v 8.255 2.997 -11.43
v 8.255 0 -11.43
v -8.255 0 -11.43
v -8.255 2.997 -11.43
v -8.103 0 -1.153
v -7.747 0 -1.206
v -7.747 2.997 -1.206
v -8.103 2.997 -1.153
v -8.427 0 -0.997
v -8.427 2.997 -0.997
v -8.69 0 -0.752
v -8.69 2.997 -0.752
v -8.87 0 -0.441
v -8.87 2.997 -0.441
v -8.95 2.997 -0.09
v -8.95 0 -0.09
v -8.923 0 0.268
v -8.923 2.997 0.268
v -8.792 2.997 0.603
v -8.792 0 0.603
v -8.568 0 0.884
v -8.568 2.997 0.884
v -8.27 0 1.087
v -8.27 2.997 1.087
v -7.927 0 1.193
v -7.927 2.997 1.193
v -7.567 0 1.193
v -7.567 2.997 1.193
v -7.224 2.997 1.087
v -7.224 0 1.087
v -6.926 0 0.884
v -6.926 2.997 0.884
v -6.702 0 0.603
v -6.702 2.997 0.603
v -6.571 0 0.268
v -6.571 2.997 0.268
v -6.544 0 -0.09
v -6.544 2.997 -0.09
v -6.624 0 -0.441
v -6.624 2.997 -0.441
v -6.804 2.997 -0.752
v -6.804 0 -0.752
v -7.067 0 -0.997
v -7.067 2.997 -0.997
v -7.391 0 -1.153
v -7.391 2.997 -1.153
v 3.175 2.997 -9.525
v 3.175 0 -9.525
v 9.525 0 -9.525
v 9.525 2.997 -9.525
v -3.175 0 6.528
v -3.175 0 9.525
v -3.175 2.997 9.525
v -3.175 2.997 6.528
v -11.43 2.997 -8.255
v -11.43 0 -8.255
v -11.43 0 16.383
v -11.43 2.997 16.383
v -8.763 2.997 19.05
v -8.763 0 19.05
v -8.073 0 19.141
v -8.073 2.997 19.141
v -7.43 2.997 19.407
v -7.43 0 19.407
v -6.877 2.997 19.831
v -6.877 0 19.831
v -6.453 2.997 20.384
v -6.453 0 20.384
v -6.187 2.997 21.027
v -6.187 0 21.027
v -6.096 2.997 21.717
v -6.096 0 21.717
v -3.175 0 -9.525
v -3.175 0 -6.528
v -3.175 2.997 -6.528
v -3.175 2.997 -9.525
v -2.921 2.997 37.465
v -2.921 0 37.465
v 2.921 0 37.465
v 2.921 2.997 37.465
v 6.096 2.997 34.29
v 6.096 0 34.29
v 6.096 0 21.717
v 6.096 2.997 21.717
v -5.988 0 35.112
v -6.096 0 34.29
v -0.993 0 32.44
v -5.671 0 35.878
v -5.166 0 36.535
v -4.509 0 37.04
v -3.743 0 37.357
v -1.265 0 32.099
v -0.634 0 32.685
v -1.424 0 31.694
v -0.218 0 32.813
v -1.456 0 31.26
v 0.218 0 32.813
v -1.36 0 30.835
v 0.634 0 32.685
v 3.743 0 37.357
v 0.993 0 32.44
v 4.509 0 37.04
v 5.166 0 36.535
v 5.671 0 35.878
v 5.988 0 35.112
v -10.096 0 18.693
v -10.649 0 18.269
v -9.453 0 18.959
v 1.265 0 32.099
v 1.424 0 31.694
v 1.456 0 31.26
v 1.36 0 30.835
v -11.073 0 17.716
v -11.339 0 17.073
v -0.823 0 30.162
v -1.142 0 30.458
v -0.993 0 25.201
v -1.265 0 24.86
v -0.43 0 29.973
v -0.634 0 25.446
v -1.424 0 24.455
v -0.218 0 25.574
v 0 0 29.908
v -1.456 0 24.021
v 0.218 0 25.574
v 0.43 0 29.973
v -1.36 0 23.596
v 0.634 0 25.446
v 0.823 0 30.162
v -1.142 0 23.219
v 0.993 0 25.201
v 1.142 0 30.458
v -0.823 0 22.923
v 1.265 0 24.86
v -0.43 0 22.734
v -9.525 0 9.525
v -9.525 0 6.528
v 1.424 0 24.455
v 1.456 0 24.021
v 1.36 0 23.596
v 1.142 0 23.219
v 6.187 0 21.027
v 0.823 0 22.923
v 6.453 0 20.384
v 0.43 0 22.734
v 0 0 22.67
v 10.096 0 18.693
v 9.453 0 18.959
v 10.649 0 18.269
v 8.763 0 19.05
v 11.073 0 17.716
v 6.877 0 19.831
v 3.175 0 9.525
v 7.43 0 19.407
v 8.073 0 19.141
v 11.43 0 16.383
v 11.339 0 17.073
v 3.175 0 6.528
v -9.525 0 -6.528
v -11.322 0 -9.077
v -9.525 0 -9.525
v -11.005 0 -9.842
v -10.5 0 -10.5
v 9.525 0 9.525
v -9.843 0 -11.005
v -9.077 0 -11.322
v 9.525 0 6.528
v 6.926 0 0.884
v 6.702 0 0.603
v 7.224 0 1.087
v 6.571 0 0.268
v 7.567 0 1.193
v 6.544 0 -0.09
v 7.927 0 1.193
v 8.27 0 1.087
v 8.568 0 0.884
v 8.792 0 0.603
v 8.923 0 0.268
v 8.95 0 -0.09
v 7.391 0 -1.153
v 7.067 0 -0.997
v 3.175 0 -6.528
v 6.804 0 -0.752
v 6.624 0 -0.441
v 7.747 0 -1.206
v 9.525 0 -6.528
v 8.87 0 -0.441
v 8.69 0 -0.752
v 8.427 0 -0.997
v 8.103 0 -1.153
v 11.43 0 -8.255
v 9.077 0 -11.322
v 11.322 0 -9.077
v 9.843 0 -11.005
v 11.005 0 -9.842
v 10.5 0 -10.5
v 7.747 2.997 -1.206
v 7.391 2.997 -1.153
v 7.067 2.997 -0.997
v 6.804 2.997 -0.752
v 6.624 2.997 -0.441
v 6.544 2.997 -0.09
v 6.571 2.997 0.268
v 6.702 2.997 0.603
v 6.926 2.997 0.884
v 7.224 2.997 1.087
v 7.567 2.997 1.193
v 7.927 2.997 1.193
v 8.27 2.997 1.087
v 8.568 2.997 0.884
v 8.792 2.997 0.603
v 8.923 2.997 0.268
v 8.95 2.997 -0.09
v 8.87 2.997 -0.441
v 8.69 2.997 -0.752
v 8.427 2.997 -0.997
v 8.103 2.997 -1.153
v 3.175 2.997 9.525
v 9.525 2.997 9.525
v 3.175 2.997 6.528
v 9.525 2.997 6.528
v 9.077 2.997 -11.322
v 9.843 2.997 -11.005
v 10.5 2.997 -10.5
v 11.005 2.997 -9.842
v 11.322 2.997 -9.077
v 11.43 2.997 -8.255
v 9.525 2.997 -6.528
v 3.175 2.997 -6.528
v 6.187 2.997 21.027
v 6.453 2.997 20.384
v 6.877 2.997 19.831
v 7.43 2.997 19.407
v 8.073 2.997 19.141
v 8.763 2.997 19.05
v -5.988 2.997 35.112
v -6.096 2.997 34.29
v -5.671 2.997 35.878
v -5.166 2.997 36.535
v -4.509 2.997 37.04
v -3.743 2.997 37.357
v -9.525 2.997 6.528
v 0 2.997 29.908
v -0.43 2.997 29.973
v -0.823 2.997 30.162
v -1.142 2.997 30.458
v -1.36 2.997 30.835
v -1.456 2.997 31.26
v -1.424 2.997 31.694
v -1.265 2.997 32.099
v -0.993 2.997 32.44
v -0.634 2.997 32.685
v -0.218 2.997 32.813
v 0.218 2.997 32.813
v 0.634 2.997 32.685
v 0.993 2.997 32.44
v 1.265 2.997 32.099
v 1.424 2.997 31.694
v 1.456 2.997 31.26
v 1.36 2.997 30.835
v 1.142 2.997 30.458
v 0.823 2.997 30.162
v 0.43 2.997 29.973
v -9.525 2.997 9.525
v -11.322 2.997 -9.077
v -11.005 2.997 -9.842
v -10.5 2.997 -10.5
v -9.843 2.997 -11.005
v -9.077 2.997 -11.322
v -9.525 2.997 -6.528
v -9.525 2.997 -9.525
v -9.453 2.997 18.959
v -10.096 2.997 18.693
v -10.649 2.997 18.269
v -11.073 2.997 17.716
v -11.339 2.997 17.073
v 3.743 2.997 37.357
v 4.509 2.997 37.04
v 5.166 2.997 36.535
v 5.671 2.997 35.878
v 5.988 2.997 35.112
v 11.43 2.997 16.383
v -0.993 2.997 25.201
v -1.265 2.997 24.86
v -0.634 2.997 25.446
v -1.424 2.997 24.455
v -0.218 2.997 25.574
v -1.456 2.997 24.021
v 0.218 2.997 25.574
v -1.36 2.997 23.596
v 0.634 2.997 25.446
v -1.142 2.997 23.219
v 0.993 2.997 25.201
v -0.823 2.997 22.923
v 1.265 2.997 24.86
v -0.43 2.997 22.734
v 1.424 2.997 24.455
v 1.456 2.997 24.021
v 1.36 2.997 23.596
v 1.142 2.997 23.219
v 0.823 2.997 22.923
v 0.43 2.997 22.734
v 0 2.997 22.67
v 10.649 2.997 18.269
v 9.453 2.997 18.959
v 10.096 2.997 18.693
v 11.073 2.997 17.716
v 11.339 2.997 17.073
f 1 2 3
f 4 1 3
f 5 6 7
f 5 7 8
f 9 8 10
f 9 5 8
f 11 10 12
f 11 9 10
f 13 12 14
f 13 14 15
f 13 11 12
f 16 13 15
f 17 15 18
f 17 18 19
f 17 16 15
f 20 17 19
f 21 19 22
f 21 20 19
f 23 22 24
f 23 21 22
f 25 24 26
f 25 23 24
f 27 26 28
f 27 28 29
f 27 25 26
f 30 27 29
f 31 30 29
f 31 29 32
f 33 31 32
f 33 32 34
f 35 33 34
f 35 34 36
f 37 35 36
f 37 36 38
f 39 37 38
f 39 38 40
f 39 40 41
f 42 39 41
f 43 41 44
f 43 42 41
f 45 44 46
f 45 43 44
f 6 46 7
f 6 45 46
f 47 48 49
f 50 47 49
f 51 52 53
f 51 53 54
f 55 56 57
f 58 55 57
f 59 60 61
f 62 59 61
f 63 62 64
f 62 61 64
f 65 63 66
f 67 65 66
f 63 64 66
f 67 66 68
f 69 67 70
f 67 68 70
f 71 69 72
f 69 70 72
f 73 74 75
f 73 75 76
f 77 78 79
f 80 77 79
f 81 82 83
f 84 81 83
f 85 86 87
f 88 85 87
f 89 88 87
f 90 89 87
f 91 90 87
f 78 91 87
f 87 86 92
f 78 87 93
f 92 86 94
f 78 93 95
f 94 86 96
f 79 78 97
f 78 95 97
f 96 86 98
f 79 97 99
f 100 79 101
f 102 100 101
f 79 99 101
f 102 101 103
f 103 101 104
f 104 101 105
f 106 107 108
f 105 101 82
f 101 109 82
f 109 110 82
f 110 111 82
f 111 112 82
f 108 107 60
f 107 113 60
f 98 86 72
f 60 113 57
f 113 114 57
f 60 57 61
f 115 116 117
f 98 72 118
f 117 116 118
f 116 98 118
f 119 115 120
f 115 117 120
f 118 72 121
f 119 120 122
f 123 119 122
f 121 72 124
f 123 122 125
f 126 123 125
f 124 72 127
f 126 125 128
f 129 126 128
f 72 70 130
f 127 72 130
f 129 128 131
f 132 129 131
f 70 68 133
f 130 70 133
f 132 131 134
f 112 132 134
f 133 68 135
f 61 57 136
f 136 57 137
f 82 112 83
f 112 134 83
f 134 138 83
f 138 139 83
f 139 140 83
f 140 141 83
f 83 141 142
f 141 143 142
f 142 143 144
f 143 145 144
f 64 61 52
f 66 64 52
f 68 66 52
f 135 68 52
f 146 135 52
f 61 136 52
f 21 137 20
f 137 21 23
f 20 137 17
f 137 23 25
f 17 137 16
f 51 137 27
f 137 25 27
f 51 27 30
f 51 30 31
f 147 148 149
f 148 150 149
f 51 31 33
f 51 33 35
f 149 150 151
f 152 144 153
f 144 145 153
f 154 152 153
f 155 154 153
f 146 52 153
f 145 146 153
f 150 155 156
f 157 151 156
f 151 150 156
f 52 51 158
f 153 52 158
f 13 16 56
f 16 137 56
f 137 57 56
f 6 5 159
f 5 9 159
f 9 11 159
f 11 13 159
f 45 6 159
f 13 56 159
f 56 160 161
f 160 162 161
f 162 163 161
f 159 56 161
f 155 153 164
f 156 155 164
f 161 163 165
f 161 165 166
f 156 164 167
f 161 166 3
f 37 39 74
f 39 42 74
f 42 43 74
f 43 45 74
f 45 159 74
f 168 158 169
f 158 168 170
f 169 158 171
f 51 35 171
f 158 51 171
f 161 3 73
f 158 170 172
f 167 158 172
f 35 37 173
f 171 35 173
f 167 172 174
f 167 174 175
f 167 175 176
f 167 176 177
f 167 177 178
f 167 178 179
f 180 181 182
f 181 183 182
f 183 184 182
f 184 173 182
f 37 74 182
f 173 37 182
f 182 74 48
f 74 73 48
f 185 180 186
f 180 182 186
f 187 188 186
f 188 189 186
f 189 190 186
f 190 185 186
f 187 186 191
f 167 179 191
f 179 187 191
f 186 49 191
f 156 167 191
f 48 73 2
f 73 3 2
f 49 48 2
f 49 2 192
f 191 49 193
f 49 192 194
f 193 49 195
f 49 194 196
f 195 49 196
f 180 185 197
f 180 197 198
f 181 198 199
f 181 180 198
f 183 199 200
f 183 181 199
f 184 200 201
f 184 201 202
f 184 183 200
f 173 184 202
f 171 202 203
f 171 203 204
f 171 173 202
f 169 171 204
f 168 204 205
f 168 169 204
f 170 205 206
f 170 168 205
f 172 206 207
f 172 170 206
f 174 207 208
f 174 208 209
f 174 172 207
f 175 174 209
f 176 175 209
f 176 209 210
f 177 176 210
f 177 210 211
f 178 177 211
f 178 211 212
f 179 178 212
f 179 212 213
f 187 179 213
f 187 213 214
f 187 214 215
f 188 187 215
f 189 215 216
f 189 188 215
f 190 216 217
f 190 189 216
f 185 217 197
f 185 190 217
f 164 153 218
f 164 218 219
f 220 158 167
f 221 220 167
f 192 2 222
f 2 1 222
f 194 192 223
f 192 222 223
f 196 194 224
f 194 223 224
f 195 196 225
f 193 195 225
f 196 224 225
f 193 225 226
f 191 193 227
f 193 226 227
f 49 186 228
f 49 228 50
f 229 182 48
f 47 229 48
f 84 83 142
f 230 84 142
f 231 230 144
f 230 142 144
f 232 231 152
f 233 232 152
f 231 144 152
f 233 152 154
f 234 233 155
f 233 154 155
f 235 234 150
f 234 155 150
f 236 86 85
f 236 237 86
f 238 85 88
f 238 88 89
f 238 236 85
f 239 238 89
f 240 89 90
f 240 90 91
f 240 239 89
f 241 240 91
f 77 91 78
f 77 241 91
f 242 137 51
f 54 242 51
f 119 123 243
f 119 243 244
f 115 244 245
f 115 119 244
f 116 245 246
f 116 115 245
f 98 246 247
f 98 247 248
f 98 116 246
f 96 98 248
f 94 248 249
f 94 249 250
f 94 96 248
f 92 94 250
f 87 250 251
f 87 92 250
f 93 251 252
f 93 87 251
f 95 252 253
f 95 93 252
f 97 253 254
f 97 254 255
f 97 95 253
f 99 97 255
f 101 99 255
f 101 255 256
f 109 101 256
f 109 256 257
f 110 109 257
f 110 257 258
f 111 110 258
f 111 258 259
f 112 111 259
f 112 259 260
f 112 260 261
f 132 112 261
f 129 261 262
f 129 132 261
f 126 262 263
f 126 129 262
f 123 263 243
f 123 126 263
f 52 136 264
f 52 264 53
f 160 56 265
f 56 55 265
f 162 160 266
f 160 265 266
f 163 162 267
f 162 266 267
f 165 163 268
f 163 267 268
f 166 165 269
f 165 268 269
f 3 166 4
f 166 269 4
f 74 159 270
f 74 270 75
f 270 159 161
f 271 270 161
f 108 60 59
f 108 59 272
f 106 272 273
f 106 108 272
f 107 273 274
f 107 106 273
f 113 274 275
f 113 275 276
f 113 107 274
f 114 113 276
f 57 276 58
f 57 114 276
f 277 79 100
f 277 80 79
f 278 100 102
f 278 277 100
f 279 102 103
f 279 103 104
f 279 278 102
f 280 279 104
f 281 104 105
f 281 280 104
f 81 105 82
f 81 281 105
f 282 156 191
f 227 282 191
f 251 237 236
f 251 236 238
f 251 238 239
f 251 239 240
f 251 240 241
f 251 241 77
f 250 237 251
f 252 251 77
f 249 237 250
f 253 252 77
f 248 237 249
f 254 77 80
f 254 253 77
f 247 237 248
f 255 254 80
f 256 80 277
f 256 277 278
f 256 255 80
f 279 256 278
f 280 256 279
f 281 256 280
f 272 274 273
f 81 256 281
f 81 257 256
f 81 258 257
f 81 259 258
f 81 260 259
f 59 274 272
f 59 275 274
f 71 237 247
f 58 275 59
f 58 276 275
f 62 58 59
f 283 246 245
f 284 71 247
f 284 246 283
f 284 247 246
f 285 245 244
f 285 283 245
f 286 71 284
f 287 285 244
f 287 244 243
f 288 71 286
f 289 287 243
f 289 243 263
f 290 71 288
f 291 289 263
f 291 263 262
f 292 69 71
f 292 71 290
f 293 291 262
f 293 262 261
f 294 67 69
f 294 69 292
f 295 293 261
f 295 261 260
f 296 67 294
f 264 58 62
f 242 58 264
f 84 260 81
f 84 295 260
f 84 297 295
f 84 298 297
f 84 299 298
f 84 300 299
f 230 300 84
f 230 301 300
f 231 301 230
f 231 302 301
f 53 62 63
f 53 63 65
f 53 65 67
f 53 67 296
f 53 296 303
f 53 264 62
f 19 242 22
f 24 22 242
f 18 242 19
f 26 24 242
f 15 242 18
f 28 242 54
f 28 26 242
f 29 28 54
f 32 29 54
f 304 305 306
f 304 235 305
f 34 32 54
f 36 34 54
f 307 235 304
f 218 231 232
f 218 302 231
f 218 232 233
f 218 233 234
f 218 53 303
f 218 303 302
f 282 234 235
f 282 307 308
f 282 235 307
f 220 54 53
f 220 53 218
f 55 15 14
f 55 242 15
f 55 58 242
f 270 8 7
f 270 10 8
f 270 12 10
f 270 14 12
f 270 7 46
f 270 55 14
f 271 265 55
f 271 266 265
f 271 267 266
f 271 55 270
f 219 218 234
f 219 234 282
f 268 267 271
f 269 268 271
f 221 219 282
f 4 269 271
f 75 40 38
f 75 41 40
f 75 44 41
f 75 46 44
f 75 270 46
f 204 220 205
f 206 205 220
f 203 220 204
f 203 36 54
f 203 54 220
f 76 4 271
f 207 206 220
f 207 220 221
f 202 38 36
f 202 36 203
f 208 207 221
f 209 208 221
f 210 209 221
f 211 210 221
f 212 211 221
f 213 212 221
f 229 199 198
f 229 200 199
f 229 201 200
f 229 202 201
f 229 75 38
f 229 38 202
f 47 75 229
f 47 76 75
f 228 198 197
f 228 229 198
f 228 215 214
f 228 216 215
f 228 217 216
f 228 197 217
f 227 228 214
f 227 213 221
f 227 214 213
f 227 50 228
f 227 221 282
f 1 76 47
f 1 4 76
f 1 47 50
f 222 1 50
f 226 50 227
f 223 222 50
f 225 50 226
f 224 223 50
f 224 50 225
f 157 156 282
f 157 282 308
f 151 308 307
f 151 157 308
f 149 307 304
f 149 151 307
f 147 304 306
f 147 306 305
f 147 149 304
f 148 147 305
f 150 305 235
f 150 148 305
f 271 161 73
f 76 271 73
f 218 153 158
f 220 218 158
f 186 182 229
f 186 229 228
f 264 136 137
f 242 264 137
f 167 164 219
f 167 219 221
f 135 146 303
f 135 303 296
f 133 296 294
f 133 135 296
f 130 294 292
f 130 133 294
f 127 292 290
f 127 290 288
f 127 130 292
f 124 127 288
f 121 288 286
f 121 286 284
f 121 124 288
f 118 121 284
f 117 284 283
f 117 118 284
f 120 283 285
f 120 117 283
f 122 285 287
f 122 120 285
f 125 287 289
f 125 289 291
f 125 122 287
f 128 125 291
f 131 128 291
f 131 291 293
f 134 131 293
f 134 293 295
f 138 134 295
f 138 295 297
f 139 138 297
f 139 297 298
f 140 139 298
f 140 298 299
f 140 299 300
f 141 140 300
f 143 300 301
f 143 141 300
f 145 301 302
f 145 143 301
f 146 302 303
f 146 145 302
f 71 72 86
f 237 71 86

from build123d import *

# Parameters (mm, degrees)
SKETCH1_R           = 1.2065
SKETCH1_R_2         = 1.4605
SKETCH1_W           = 6.35
SKETCH1_H           = 2.9972
BOSS_EXTRUDE1_DEPTH = 2.9972
FILLET1_R           = 3.175
FILLET2_START       = -1
FILLET2_DEPTH       = 5
FILLET2_2_DEPTH     = 2.9972


with BuildPart() as part:
    # Sketch1 → Boss-Extrude1 (new body)
    with BuildSketch(Plane(origin=(0, 0, 0), x_dir=(1, 0, 0), z_dir=(0, 1, 0))):
        Polygon((-11.43, -11.43), (-11.43, -19.05), (-6.096, -19.05), (-6.096, -37.465), (0, -37.465), (6.096, -37.465), (6.096, -19.05), (11.43, -19.05), (11.43, -11.43), (11.43, 11.43), (-11.43, 11.43), align=None)
        with Locations(Location((-7.747, 0, 0), (0, 0, 90))):
            Circle(SKETCH1_R, mode=Mode.SUBTRACT)
        with Locations(Location((7.747, 0, 0), (0, 0, 90))):
            Circle(SKETCH1_R, mode=Mode.SUBTRACT)
        with Locations(Location((0, -24.13, 0), (0, 0, 90))):
            Circle(SKETCH1_R_2, mode=Mode.SUBTRACT)
        with Locations(Location((0, -31.369, 0), (0, 0, 90))):
            Circle(SKETCH1_R_2, mode=Mode.SUBTRACT)
        with Locations((6.35, 8.0264)):
            Rectangle(SKETCH1_W, SKETCH1_H, mode=Mode.SUBTRACT)
        with Locations((-6.35, -8.0264)):
            Rectangle(SKETCH1_W, SKETCH1_H, mode=Mode.SUBTRACT)
        with Locations((6.35, -8.0264)):
            Rectangle(SKETCH1_W, SKETCH1_H, mode=Mode.SUBTRACT)
        with Locations((-6.35, 8.0264)):
            Rectangle(SKETCH1_W, SKETCH1_H, mode=Mode.SUBTRACT)
    extrude(amount=BOSS_EXTRUDE1_DEPTH)

    # Fillet1
    fillet1_edges = [part.edges().sort_by_distance(p)[0] for p in [
        (-6.096, 1.4986, 37.465),
        (-11.43, 1.4986, -11.43),
        (11.43, 1.4986, -11.43),
        (6.096, 1.4986, 37.465),
    ]]
    fillet(fillet1_edges, radius=FILLET1_R)

    # Fillet2: read off the stored shape, not the designer's step
    # Fillet2 outline → Fillet2 (cut)
    with BuildSketch(Plane(origin=(0, 0, 0), x_dir=(1, 0, 0), z_dir=(0, 1, 0)).offset(FILLET2_START)):
        with BuildLine():
            ThreePointArc((11.43, -16.383), (10.648853785, -18.268853785), (8.763, -19.05))
            Line((8.763, -19.05), (11.43, -19.05))
            Line((11.43, -19.05), (11.43, -16.383))
        make_face()
        with BuildLine():
            Line((-11.43, -19.05), (-8.763, -19.05))
            ThreePointArc((-8.763, -19.05), (-10.648853785, -18.268853785), (-11.43, -16.383))
            Line((-11.43, -16.383), (-11.43, -19.05))
        make_face()
    extrude(amount=FILLET2_DEPTH, mode=Mode.SUBTRACT)

    # Fillet2 2 outline → Fillet2 2 (add)
    with BuildSketch(Plane(origin=(0, 0, 0), x_dir=(1, 0, 0), z_dir=(0, 1, 0))):
        with BuildLine():
            ThreePointArc((6.096, -21.717), (6.877146215, -19.831146215), (8.763, -19.05))
            Line((8.763, -19.05), (6.096, -19.05))
            Line((6.096, -19.05), (6.096, -21.717))
        make_face()
        with BuildLine():
            Line((-6.096, -19.05), (-8.763, -19.05))
            ThreePointArc((-8.763, -19.05), (-6.877146215, -19.831146215), (-6.096, -21.717))
            Line((-6.096, -21.717), (-6.096, -19.05))
        make_face()
    extrude(amount=FILLET2_2_DEPTH)


solid = part.part
